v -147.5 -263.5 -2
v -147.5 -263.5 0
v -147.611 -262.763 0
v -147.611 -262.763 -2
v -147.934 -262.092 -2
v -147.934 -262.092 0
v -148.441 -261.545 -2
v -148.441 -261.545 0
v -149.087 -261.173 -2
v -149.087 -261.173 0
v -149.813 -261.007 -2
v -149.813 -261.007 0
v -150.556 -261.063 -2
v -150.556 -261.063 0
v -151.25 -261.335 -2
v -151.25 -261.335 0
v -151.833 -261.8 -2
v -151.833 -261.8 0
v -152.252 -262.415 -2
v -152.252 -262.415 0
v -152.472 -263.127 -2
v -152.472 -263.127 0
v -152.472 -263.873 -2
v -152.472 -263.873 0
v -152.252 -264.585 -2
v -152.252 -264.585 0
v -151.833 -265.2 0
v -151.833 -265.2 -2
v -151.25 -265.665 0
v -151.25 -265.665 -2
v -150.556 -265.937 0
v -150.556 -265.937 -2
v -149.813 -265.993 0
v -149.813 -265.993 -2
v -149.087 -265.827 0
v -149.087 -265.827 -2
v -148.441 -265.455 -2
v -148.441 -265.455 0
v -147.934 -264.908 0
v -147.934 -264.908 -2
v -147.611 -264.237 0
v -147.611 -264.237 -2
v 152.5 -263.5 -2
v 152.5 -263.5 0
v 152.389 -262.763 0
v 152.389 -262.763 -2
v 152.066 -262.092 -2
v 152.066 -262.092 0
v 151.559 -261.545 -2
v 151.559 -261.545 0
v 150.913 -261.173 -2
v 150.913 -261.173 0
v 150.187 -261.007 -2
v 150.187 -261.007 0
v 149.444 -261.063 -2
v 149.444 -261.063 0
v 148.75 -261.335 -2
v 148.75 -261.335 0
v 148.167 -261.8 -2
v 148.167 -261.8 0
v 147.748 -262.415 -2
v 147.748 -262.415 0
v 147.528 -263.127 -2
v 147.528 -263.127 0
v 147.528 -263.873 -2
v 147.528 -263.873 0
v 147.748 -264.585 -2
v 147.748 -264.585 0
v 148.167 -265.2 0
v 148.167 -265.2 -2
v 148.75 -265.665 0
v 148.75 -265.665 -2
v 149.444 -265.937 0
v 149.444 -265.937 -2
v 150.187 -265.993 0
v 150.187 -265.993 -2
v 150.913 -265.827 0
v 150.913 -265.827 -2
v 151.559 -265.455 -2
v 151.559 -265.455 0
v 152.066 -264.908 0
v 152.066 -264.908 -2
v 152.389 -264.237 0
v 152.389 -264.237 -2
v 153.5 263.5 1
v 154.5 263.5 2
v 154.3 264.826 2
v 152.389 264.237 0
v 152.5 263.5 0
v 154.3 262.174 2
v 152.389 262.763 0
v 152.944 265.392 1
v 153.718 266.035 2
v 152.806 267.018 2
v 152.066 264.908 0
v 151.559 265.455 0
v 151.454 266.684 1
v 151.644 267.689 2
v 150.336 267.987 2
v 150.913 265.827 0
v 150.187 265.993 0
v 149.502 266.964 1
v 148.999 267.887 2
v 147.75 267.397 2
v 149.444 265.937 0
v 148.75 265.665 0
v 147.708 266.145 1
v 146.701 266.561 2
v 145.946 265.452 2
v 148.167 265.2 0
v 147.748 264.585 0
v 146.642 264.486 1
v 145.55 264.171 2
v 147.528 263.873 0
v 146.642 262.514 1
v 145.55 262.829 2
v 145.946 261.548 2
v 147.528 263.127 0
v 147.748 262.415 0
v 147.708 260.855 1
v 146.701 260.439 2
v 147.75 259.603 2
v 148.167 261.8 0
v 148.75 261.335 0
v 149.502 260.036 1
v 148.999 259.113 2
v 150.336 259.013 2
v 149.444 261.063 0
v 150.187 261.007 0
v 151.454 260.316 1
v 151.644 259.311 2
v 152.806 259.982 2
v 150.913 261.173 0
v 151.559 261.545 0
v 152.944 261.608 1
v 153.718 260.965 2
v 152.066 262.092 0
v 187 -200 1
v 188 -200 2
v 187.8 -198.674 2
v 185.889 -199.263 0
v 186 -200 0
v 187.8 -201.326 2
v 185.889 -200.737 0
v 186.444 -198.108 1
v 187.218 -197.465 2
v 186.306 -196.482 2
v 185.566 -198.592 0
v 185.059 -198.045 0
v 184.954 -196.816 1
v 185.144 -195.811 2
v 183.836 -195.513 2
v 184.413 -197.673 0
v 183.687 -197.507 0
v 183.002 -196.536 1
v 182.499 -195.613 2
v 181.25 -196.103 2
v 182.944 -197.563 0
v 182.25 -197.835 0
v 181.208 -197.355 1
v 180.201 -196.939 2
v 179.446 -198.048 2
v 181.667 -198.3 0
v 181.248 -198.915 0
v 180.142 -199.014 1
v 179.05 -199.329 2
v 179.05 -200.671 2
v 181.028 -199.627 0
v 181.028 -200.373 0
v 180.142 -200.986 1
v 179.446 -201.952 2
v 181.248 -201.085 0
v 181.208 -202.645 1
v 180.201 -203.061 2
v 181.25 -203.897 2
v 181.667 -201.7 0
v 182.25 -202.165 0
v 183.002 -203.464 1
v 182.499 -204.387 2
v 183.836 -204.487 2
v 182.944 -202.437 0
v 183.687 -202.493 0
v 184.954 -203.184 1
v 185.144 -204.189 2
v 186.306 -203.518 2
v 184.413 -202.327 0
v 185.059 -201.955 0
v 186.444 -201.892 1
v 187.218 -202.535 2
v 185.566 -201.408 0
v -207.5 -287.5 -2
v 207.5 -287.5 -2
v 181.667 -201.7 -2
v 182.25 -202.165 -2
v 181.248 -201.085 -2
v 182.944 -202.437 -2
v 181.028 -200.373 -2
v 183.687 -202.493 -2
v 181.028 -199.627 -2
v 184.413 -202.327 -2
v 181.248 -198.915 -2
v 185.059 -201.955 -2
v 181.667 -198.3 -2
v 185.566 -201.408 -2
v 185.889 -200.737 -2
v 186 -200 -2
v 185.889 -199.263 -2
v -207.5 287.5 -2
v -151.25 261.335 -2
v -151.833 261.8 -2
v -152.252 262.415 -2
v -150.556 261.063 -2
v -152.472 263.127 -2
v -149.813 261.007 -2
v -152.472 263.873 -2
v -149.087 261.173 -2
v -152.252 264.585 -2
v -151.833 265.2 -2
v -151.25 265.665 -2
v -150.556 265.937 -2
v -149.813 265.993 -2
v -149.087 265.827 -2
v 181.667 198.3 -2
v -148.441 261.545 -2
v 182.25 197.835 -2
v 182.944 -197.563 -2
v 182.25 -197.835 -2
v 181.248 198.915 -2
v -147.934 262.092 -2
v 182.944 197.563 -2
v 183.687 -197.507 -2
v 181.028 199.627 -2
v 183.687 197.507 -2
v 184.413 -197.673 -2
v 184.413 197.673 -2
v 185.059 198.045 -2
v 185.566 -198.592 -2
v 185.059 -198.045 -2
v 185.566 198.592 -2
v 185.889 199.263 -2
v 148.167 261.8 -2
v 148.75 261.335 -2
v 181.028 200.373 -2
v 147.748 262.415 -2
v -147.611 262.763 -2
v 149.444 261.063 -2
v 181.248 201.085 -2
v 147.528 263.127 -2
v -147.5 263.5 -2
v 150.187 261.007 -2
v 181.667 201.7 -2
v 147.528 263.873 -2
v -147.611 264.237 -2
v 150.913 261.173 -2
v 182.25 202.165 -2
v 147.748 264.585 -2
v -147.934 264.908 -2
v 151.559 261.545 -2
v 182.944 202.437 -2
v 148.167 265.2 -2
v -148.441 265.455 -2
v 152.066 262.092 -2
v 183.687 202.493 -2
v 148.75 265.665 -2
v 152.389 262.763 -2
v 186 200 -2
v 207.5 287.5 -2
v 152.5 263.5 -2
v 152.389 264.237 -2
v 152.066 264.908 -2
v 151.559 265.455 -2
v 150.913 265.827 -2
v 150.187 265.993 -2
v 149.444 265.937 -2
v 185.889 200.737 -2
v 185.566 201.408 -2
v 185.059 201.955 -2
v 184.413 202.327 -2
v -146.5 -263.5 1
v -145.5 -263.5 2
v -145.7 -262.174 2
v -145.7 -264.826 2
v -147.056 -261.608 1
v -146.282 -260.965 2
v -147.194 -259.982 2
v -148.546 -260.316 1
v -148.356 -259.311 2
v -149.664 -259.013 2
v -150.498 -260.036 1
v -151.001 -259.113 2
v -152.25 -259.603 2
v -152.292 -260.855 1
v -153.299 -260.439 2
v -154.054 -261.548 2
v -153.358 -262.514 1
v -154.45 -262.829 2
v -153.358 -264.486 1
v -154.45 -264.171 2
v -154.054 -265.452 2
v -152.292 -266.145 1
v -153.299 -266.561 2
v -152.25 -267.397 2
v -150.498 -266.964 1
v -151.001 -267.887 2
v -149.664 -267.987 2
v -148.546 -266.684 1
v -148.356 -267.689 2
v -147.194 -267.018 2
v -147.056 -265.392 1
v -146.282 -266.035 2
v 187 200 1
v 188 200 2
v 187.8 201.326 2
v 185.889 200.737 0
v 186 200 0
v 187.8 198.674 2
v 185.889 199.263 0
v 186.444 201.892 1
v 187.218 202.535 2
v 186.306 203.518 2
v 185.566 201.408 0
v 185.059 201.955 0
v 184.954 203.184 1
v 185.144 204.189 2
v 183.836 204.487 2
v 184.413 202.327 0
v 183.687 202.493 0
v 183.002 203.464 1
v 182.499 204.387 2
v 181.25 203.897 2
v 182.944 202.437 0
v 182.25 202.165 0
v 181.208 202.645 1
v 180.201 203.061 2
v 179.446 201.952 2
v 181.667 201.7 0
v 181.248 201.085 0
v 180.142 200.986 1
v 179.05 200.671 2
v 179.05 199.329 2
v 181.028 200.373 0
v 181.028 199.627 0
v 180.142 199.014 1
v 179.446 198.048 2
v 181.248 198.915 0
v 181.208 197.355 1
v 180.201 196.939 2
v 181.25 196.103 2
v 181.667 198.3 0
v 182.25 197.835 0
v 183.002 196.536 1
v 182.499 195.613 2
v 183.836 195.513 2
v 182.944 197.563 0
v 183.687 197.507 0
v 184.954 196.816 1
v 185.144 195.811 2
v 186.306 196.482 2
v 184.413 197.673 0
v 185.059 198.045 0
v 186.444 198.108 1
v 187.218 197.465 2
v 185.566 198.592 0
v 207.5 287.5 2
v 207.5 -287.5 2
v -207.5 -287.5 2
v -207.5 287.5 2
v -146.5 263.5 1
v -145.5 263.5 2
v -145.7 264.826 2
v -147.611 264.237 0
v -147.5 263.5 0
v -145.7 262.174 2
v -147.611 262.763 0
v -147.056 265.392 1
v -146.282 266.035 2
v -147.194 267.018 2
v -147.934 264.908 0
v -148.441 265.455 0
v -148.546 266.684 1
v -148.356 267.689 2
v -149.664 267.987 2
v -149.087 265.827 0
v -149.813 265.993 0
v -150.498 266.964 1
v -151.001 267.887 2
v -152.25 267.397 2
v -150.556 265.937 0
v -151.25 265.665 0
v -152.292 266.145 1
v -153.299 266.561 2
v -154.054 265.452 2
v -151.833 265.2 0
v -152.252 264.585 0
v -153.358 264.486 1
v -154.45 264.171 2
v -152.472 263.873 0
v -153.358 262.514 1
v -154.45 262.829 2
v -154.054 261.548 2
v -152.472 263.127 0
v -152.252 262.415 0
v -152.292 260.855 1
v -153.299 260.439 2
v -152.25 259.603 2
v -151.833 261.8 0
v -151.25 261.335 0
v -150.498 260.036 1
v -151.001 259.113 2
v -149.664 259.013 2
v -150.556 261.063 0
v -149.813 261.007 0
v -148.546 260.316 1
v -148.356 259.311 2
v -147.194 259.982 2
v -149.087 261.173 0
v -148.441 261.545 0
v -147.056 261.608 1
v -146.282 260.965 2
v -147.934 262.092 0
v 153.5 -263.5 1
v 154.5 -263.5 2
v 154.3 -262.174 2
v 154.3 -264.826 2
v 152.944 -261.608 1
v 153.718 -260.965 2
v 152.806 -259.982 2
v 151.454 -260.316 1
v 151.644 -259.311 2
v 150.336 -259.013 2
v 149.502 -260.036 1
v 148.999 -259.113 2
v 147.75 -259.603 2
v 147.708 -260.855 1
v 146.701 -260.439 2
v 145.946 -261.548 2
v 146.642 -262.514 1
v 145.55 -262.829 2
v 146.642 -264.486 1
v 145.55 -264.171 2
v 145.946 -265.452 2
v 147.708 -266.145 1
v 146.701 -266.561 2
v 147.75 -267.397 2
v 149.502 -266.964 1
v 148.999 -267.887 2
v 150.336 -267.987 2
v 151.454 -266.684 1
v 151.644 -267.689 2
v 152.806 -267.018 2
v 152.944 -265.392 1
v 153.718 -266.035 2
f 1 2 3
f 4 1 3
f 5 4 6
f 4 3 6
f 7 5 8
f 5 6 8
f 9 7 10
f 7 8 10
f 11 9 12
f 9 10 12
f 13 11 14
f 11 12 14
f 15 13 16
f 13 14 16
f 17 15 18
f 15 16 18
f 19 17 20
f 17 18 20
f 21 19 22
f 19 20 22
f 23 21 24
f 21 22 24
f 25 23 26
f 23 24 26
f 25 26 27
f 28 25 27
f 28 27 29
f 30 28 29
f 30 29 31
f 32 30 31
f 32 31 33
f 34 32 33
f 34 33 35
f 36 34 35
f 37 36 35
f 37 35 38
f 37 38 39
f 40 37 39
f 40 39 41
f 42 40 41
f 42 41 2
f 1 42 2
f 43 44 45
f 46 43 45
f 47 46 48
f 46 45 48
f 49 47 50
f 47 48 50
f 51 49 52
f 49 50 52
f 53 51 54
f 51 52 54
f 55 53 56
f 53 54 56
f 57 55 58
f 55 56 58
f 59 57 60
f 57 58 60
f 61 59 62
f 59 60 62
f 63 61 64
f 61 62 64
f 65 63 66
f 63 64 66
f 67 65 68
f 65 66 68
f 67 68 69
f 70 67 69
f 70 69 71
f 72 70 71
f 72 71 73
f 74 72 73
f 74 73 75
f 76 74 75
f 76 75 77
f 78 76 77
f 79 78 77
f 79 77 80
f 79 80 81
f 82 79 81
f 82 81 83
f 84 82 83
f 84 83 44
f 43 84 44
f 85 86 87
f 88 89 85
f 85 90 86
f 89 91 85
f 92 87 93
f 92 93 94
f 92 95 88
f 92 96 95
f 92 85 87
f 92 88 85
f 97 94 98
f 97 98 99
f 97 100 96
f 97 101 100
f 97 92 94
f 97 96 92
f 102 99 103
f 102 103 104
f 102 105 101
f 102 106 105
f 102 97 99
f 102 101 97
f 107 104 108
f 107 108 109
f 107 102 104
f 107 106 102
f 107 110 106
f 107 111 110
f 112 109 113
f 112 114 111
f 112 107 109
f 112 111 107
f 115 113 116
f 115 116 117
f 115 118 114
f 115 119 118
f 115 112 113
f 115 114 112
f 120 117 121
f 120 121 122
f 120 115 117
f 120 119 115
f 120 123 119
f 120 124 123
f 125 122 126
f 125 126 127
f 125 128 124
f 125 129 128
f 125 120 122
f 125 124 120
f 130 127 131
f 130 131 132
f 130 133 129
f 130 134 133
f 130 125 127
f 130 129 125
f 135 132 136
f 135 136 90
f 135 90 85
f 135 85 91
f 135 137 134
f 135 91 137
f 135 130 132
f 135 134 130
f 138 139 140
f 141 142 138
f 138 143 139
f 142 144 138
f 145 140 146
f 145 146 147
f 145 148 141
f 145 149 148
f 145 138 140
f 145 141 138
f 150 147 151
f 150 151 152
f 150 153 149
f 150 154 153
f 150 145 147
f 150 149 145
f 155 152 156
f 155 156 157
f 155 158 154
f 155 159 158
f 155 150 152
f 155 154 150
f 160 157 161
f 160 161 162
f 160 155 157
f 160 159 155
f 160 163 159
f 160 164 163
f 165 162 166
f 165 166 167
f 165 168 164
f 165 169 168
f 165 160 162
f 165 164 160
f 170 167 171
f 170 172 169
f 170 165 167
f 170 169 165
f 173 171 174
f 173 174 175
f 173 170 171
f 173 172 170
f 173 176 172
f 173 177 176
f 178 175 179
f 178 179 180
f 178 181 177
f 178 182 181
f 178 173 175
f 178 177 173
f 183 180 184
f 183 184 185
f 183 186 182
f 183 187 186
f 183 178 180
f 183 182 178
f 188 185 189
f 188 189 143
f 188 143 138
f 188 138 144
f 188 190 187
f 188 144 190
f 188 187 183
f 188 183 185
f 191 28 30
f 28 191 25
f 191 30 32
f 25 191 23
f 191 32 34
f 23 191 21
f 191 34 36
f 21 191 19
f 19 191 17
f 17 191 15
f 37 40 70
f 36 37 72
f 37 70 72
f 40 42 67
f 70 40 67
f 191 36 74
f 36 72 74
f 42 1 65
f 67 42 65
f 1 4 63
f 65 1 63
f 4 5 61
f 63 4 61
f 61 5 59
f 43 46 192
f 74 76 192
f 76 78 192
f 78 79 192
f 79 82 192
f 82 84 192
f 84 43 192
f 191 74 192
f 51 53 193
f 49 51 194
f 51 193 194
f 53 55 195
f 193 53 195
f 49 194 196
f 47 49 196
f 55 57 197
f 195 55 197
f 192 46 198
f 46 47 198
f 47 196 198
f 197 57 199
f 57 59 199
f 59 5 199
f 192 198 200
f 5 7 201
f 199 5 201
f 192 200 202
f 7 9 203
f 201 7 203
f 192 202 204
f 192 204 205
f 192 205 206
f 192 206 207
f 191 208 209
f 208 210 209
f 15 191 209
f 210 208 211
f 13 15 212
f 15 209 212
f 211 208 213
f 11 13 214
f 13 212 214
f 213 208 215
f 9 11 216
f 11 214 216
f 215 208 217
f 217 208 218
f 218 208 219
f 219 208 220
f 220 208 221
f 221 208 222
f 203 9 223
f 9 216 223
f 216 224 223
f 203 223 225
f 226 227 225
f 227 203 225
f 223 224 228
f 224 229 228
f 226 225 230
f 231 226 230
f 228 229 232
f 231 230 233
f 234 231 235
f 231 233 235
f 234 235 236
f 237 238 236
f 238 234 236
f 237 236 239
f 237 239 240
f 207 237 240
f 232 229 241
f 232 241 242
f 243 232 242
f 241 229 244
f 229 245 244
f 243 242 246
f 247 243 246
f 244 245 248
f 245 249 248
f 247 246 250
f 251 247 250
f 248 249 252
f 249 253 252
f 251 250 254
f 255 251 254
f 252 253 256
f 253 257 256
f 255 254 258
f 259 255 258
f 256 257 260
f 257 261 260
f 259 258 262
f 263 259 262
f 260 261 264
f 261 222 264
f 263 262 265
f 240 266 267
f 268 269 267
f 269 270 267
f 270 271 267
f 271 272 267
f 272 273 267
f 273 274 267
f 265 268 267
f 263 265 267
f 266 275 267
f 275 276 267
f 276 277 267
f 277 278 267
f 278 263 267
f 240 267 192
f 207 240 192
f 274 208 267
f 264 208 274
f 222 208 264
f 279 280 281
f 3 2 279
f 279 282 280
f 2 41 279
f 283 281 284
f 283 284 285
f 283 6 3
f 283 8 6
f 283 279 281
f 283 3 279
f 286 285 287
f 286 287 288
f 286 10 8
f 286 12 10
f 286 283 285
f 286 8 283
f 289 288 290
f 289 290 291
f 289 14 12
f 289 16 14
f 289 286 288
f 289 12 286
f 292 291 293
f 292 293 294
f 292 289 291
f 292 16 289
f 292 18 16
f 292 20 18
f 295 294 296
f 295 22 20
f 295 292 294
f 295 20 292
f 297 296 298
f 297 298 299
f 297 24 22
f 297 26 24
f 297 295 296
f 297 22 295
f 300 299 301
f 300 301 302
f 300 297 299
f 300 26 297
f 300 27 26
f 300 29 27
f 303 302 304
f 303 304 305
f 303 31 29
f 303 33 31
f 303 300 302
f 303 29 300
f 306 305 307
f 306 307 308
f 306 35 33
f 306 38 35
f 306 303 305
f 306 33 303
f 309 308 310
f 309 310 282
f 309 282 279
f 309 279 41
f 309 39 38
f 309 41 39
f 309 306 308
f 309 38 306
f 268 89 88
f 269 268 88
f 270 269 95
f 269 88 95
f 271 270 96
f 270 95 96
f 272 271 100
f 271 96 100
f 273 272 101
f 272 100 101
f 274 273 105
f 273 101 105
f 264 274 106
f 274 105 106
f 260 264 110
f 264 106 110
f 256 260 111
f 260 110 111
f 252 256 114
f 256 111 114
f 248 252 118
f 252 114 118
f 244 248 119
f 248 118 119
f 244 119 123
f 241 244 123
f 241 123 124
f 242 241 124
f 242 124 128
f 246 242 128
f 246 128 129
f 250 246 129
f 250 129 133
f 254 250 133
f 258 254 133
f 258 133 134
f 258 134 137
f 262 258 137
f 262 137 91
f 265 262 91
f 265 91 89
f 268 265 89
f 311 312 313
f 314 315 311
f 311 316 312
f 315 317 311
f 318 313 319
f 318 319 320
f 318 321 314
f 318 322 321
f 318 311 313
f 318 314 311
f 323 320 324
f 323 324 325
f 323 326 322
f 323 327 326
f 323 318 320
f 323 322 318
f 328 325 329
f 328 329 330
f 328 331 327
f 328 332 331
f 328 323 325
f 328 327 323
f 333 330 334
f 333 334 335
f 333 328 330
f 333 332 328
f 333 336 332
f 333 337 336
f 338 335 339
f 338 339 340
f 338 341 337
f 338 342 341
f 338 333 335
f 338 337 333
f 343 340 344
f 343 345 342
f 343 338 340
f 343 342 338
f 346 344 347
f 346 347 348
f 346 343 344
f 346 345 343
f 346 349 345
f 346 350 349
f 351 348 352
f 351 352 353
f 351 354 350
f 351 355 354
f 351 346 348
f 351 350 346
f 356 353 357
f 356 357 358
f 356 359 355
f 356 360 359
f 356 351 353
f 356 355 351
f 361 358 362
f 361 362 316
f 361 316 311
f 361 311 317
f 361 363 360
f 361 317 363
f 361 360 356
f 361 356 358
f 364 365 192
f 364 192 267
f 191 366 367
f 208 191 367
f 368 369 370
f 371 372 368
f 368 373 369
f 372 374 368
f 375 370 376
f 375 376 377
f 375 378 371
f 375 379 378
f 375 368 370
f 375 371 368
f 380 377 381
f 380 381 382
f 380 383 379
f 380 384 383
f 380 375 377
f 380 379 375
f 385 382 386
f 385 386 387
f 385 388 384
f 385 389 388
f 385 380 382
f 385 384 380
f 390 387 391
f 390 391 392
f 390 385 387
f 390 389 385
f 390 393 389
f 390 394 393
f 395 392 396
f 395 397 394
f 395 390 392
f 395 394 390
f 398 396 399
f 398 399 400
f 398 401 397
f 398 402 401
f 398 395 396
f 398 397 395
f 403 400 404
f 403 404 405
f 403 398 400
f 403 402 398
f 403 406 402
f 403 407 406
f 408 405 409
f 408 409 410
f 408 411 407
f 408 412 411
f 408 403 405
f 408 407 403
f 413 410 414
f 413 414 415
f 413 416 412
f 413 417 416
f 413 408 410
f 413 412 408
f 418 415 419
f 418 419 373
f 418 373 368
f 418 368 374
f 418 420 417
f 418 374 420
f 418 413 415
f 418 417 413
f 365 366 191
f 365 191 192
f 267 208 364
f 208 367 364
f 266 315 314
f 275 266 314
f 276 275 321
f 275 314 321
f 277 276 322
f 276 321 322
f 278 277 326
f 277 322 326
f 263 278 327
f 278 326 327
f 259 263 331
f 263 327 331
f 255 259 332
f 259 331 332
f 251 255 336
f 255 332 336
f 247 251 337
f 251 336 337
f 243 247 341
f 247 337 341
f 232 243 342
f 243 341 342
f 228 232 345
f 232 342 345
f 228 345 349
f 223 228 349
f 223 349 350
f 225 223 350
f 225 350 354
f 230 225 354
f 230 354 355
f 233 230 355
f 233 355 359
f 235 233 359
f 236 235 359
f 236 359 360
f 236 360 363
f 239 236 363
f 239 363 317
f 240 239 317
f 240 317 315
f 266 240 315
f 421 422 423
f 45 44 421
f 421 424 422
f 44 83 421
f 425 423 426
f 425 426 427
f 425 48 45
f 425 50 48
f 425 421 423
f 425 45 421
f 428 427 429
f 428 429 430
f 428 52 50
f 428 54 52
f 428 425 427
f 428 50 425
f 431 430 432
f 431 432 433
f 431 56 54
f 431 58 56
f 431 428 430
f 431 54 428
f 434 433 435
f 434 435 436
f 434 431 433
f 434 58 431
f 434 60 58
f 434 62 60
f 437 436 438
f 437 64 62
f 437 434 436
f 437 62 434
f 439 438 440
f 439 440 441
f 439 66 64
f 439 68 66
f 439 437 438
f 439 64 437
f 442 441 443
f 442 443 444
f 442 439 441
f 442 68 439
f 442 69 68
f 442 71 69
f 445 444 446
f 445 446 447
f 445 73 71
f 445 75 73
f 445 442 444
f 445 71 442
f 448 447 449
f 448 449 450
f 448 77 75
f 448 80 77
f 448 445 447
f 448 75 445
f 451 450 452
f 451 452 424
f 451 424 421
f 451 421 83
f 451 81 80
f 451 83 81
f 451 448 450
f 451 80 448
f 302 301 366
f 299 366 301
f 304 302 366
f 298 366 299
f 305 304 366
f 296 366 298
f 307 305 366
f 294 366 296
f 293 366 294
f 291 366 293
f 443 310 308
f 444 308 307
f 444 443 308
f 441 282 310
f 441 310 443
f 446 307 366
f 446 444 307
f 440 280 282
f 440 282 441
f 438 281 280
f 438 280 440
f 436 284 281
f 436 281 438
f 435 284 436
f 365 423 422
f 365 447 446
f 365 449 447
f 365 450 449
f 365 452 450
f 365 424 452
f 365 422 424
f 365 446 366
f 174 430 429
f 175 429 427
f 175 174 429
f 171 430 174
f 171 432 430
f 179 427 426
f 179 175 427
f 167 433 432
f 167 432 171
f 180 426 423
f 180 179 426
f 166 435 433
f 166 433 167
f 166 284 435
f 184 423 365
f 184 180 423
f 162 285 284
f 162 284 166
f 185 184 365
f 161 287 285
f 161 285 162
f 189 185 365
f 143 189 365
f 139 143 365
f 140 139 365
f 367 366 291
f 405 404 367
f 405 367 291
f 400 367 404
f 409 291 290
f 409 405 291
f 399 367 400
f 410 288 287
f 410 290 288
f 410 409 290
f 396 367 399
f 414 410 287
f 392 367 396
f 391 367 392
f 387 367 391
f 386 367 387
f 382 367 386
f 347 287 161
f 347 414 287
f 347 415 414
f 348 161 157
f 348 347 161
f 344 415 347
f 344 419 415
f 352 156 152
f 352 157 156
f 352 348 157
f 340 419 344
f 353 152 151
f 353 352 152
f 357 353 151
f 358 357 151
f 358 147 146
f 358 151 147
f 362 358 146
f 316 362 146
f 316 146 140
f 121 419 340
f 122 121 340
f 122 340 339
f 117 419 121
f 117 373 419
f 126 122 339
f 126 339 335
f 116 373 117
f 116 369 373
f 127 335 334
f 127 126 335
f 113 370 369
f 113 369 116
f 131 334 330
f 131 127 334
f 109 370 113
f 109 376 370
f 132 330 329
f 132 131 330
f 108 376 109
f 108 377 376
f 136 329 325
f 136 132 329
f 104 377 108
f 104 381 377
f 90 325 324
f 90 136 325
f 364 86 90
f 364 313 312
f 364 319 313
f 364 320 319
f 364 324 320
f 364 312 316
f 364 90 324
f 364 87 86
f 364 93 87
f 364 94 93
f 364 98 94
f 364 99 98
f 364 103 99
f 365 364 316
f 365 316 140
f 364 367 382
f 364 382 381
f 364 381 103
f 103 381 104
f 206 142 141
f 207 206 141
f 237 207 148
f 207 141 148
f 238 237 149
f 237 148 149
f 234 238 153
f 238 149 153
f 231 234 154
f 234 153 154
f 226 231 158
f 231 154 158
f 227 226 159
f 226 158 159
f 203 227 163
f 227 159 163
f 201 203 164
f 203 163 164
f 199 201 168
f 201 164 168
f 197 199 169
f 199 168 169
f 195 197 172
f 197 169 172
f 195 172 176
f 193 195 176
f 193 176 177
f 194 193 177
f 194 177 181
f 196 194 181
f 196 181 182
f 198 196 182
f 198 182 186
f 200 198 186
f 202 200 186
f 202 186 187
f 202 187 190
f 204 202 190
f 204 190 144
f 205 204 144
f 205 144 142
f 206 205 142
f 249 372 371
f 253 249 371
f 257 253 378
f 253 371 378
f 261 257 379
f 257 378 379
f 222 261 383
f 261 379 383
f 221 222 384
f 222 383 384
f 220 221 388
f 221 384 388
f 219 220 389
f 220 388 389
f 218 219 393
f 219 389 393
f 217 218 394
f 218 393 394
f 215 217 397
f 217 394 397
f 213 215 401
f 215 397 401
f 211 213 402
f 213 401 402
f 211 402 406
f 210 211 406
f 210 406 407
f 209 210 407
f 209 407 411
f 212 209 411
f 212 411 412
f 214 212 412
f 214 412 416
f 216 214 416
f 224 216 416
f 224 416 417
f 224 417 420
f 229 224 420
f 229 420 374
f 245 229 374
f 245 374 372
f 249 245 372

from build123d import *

# Parameters (mm, degrees)
ESQUISSE1_W             = 415
ESQUISSE1_H             = 575
BOSS_EXTRU_1_DEPTH      = 2
ESQUISSE2_R             = 2.5
ENL_V_MAT_EXTRU_1_DEPTH = 355.582148451
CHANFREIN1_SIZE         = 2


with BuildPart() as part:
    # Esquisse1 → Boss.-Extru.1 (new, symmetric)
    with BuildSketch(Plane.XY):
        Rectangle(ESQUISSE1_W, ESQUISSE1_H)
    extrude(amount=BOSS_EXTRU_1_DEPTH, both=True)

    # Esquisse2 → Enlèv. mat.-Extru.1 (cut, through all)
    with BuildSketch(Plane.XY.offset(2)):
        with Locations((-150, -263.5)):
            Circle(ESQUISSE2_R)
        with Locations((150, -263.5)):
            Circle(ESQUISSE2_R)
        with Locations((183.5, -200)):
            Circle(ESQUISSE2_R)
        with Locations((183.5, 200)):
            Circle(ESQUISSE2_R)
        with Locations((-150, 263.5)):
            Circle(ESQUISSE2_R)
        with Locations((150, 263.5)):
            Circle(ESQUISSE2_R)
    extrude(amount=-ENL_V_MAT_EXTRU_1_DEPTH, mode=Mode.SUBTRACT)

    # Chanfrein1
    chanfrein1_edges = [part.edges().sort_by_distance(p)[0] for p in [
        (147.5, -263.5, 2),
        (181, -200, 2),
        (181, 200, 2),
        (-152.5, 263.5, 2),
        (147.5, 263.5, 2),
        (-152.5, -263.5, 2),
    ]]
    chamfer(chanfrein1_edges, length=CHANFREIN1_SIZE)


solid = part.part
